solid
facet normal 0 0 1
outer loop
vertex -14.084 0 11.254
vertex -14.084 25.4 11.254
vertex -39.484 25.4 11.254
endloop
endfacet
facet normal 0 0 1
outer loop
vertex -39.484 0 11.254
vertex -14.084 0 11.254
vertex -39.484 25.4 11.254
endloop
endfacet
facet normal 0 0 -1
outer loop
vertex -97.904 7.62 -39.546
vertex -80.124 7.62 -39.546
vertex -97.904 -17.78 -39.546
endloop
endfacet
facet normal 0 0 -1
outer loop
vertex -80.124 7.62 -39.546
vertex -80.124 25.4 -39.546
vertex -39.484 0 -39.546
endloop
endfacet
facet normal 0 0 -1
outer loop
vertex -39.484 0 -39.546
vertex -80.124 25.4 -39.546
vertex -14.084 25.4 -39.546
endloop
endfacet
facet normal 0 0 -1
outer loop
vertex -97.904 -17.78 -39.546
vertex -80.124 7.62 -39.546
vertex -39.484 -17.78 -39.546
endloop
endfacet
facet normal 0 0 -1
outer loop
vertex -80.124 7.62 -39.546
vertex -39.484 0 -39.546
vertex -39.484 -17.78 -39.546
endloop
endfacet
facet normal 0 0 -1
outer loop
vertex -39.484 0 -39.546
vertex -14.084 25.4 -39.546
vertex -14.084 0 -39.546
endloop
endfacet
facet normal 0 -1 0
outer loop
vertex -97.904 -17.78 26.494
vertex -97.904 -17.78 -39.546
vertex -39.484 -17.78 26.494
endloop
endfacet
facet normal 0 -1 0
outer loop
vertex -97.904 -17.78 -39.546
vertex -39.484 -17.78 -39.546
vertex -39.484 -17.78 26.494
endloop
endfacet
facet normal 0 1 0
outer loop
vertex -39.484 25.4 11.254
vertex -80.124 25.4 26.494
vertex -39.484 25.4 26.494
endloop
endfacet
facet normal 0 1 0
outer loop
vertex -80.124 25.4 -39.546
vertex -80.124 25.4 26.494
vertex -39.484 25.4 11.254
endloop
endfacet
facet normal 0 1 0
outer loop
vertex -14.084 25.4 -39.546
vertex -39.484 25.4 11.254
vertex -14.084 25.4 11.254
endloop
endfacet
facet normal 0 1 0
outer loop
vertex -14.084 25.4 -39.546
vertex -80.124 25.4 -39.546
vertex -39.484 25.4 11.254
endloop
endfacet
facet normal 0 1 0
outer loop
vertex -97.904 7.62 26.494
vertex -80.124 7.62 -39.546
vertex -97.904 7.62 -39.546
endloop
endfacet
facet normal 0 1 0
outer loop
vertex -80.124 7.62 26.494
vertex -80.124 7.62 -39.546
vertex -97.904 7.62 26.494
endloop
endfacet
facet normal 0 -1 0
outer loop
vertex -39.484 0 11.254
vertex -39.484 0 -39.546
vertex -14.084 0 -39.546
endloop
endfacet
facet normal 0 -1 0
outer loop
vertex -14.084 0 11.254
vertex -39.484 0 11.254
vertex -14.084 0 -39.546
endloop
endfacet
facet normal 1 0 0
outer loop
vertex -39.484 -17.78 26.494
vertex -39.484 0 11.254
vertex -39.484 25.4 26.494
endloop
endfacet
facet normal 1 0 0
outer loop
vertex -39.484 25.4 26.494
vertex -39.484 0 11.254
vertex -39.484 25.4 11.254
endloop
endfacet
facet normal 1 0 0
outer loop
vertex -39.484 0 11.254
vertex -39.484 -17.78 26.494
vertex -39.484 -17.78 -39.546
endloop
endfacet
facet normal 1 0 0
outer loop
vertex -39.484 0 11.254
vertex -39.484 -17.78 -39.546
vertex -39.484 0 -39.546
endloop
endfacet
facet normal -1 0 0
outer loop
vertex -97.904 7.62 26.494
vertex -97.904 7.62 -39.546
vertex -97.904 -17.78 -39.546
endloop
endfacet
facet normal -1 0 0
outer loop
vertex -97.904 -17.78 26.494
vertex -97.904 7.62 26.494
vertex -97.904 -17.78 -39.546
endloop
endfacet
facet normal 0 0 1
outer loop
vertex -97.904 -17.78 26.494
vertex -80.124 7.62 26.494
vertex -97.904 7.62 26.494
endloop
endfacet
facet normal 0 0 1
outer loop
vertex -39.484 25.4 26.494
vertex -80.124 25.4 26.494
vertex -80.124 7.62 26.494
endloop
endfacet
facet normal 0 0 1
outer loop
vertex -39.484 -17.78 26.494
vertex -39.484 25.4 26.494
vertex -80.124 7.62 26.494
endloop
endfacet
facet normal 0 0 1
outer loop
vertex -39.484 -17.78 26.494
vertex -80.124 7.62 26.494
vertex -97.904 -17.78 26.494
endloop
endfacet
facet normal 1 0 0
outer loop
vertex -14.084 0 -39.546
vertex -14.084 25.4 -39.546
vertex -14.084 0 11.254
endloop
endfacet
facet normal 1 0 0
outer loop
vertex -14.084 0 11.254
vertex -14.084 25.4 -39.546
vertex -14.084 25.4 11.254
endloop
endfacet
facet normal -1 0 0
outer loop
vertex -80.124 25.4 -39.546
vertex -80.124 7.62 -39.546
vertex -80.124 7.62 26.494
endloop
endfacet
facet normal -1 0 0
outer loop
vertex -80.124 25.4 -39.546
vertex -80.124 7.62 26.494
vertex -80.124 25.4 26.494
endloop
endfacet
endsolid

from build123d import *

# Parameters (mm, degrees)
F0_W     = 66.04
F0_H     = 50.8
F1_DEPTH = 25.4
F2_W     = 40.64
F2_H     = 25.4
F2_W_2   = 25.4
F3_DEPTH = 17.78
F4_W     = 40.64
F4_H     = 43.18
F5_DEPTH = 15.24
F6_W     = 25.4
F6_H     = 25.4
F7_DEPTH = 17.78
F8_W     = 25.4
F8_H     = 66.04
F9_DEPTH = 17.78


with BuildPart() as f1:
    # F0 (on Front) → F1 (new body)
    with BuildSketch(Plane.XZ):
        with Locations((-47.104301, -14.145544)):
            Rectangle(F0_W, F0_H)
    extrude(amount=-F1_DEPTH)

    # F2 (on face) → F3 (join)
    with BuildSketch(Plane.XZ):
        with Locations((-59.804301, -1.445544)):
            Rectangle(F2_W, F2_H)
        with Locations((-59.804301, -26.845544)):
            Rectangle(F2_W, F2_H)
        with Locations((-26.784301, -1.445544)):
            Rectangle(F2_W_2, F2_H)
    extrude(amount=F3_DEPTH)

    # F4 (on face) → F5 (join)
    with BuildSketch(Plane.XY.offset(11.254456)):
        with Locations((-59.804301, 3.81)):
            Rectangle(F4_W, F4_H)
    extrude(amount=F5_DEPTH)

    # F6 (on face) → F7 (cut)
    with BuildSketch(Plane.XZ.offset(17.78)):
        with Locations((-26.784301, -1.445544)):
            Rectangle(F6_W, F6_H)
    extrude(amount=-F7_DEPTH, mode=Mode.SUBTRACT)

    # F8 (on face) → F9 (join)
    with BuildSketch(Plane(origin=(-80.124301, 0, 0), x_dir=(0, -1, 0), z_dir=(-1, 0, 0))):
        with Locations((5.08, -6.525544)):
            Rectangle(F8_W, F8_H)
    extrude(amount=F9_DEPTH)


solid = f1.part
